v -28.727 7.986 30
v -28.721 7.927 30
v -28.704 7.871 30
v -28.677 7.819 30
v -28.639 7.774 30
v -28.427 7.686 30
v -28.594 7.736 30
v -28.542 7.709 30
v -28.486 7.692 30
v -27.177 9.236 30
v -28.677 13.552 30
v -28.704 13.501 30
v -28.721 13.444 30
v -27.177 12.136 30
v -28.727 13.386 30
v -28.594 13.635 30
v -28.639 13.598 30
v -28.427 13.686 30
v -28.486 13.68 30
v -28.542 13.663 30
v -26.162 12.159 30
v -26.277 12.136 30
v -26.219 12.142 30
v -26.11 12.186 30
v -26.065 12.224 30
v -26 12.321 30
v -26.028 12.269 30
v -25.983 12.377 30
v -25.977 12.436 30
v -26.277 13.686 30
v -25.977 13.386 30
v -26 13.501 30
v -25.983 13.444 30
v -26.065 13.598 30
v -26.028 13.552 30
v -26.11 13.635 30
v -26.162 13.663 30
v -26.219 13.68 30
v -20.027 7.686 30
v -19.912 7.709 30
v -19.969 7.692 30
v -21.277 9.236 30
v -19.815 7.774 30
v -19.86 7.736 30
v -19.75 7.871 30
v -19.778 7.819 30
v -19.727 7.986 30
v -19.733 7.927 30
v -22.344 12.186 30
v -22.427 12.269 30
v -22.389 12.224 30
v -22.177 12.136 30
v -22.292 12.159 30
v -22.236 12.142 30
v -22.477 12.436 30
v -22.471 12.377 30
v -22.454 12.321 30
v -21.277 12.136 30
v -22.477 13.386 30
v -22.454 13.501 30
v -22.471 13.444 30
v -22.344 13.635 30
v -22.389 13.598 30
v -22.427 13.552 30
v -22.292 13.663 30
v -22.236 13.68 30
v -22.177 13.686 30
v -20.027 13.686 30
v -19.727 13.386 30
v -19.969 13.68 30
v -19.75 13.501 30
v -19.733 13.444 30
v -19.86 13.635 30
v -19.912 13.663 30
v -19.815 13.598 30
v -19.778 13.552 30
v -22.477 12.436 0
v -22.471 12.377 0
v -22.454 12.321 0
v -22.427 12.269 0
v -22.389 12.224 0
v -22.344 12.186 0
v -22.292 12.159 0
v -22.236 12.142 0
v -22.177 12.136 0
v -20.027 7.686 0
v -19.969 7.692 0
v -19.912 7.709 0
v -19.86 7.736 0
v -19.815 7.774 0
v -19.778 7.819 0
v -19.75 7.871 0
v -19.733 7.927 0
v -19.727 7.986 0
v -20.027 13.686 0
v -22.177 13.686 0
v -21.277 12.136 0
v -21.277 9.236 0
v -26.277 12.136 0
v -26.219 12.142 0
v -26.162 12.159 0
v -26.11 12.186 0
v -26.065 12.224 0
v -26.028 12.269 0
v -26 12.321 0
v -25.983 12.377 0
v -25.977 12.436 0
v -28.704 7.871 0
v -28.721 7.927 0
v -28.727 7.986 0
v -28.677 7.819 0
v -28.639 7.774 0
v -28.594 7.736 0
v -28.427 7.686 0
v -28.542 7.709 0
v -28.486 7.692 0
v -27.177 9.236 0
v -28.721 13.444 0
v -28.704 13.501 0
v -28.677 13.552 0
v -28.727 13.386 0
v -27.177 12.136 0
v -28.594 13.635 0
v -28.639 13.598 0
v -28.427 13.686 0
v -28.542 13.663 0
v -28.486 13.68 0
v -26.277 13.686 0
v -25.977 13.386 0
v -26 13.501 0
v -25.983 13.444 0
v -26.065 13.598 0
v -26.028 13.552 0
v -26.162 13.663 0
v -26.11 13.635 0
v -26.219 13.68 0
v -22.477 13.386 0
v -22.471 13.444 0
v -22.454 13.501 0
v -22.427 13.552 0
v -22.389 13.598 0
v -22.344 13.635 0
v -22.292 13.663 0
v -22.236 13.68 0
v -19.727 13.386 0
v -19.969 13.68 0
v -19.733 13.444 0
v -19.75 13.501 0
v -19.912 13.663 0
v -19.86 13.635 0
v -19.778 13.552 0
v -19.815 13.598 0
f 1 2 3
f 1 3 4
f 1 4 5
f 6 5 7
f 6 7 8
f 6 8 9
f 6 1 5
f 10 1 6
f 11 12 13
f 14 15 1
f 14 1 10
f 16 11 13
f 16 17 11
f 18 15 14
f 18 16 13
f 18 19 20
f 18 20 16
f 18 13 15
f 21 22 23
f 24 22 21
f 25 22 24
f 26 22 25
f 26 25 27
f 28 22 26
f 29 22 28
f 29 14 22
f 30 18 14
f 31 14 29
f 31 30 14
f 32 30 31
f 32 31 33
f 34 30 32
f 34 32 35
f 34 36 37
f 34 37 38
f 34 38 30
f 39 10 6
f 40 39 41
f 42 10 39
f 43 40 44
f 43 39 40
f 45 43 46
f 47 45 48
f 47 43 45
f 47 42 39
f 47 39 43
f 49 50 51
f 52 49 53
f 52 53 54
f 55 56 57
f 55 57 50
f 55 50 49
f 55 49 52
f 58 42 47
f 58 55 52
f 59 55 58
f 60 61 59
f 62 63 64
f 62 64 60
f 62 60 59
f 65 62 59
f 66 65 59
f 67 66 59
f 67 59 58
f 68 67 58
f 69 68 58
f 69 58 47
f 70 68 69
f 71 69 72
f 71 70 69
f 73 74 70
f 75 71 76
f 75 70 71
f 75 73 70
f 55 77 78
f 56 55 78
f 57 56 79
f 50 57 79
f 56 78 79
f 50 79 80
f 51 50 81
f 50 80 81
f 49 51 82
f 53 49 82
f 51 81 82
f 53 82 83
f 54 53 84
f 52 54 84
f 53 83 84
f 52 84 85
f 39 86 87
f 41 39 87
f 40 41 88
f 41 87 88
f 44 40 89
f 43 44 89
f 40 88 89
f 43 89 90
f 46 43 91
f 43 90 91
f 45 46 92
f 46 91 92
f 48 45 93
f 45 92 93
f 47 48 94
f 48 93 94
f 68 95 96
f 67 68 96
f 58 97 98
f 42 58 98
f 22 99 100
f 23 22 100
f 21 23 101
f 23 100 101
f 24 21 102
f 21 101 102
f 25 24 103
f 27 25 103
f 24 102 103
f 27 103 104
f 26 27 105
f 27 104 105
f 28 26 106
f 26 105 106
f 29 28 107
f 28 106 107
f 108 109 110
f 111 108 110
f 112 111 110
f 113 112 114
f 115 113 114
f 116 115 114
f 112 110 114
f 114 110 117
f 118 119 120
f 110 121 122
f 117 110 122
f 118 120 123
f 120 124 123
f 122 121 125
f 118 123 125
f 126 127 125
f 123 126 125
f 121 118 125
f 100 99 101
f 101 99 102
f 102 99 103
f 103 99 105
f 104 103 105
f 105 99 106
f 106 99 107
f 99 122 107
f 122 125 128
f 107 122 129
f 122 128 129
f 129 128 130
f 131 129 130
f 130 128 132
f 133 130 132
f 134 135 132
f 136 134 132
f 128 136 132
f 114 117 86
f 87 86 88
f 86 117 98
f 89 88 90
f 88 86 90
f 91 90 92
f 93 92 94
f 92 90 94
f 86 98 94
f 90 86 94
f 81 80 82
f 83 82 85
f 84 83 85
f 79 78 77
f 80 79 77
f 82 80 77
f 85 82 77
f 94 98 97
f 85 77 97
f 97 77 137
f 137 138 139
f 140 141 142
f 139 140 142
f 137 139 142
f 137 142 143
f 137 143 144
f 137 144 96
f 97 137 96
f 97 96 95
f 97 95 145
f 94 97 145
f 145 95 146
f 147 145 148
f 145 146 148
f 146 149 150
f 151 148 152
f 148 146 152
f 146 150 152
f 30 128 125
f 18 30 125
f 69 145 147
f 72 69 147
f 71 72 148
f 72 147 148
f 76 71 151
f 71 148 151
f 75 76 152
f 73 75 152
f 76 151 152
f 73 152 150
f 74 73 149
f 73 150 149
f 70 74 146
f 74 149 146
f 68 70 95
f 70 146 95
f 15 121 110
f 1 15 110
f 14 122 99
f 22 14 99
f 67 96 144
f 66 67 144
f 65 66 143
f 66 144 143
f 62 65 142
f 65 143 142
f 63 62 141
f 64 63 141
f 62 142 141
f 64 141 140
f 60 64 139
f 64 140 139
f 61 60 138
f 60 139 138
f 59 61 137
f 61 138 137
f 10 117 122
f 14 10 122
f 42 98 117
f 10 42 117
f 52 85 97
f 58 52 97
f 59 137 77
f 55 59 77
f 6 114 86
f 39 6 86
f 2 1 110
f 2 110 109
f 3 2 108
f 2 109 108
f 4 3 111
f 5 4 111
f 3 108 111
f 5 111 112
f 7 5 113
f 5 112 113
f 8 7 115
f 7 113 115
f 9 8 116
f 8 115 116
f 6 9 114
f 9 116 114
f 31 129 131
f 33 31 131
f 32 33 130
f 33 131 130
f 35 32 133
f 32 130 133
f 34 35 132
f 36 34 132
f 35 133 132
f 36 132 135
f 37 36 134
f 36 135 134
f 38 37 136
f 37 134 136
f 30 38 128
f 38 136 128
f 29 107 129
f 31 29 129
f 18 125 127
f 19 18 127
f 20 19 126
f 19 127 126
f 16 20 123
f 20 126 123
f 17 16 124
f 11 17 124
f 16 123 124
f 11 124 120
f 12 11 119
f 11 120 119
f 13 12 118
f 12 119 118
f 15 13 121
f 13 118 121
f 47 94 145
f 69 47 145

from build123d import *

# Parameters (mm, degrees)
EXTRUDE_1_DEPTH = 30


with BuildPart() as part:
    # 草图1 → 凸台-拉伸1 (new body)
    with BuildSketch(Plane.XY):
        with BuildLine():
            Line((-28.427104886, 7.685760518), (-20.027104886, 7.685760518))
            ThreePointArc((-20.027104886, 7.685760518), (-19.814972852, 7.773628483), (-19.727104886, 7.985760518))
            Line((-19.727104886, 7.985760518), (-19.727104886, 13.385760518))
            ThreePointArc((-19.727104886, 13.385760518), (-19.814972852, 13.597892552), (-20.027104886, 13.685760518))
            Line((-20.027104886, 13.685760518), (-22.177104886, 13.685760518))
            ThreePointArc((-22.177104886, 13.685760518), (-22.389236921, 13.597892552), (-22.477104886, 13.385760518))
            Line((-22.477104886, 13.385760518), (-22.477104886, 12.435760518))
            ThreePointArc((-22.477104886, 12.435760518), (-22.389236921, 12.223628483), (-22.177104886, 12.135760518))
            Line((-22.177104886, 12.135760518), (-21.277104886, 12.135760518))
            Line((-21.277104886, 12.135760518), (-21.277104886, 9.235760518))
            Line((-21.277104886, 9.235760518), (-27.177104886, 9.235760518))
            Line((-27.177104886, 9.235760518), (-27.177104886, 12.135760518))
            Line((-27.177104886, 12.135760518), (-26.277104886, 12.135760518))
            ThreePointArc((-26.277104886, 12.135760518), (-26.064972852, 12.223628483), (-25.977104886, 12.435760518))
            Line((-25.977104886, 12.435760518), (-25.977104886, 13.385760518))
            ThreePointArc((-25.977104886, 13.385760518), (-26.064972852, 13.597892552), (-26.277104886, 13.685760518))
            Line((-26.277104886, 13.685760518), (-28.427104886, 13.685760518))
            ThreePointArc((-28.427104886, 13.685760518), (-28.639236921, 13.597892552), (-28.727104886, 13.385760518))
            Line((-28.727104886, 13.385760518), (-28.727104886, 7.985760518))
            ThreePointArc((-28.727104886, 7.985760518), (-28.639236921, 7.773628483), (-28.427104886, 7.685760518))
        make_face()
    extrude(amount=EXTRUDE_1_DEPTH)


solid = part.part
